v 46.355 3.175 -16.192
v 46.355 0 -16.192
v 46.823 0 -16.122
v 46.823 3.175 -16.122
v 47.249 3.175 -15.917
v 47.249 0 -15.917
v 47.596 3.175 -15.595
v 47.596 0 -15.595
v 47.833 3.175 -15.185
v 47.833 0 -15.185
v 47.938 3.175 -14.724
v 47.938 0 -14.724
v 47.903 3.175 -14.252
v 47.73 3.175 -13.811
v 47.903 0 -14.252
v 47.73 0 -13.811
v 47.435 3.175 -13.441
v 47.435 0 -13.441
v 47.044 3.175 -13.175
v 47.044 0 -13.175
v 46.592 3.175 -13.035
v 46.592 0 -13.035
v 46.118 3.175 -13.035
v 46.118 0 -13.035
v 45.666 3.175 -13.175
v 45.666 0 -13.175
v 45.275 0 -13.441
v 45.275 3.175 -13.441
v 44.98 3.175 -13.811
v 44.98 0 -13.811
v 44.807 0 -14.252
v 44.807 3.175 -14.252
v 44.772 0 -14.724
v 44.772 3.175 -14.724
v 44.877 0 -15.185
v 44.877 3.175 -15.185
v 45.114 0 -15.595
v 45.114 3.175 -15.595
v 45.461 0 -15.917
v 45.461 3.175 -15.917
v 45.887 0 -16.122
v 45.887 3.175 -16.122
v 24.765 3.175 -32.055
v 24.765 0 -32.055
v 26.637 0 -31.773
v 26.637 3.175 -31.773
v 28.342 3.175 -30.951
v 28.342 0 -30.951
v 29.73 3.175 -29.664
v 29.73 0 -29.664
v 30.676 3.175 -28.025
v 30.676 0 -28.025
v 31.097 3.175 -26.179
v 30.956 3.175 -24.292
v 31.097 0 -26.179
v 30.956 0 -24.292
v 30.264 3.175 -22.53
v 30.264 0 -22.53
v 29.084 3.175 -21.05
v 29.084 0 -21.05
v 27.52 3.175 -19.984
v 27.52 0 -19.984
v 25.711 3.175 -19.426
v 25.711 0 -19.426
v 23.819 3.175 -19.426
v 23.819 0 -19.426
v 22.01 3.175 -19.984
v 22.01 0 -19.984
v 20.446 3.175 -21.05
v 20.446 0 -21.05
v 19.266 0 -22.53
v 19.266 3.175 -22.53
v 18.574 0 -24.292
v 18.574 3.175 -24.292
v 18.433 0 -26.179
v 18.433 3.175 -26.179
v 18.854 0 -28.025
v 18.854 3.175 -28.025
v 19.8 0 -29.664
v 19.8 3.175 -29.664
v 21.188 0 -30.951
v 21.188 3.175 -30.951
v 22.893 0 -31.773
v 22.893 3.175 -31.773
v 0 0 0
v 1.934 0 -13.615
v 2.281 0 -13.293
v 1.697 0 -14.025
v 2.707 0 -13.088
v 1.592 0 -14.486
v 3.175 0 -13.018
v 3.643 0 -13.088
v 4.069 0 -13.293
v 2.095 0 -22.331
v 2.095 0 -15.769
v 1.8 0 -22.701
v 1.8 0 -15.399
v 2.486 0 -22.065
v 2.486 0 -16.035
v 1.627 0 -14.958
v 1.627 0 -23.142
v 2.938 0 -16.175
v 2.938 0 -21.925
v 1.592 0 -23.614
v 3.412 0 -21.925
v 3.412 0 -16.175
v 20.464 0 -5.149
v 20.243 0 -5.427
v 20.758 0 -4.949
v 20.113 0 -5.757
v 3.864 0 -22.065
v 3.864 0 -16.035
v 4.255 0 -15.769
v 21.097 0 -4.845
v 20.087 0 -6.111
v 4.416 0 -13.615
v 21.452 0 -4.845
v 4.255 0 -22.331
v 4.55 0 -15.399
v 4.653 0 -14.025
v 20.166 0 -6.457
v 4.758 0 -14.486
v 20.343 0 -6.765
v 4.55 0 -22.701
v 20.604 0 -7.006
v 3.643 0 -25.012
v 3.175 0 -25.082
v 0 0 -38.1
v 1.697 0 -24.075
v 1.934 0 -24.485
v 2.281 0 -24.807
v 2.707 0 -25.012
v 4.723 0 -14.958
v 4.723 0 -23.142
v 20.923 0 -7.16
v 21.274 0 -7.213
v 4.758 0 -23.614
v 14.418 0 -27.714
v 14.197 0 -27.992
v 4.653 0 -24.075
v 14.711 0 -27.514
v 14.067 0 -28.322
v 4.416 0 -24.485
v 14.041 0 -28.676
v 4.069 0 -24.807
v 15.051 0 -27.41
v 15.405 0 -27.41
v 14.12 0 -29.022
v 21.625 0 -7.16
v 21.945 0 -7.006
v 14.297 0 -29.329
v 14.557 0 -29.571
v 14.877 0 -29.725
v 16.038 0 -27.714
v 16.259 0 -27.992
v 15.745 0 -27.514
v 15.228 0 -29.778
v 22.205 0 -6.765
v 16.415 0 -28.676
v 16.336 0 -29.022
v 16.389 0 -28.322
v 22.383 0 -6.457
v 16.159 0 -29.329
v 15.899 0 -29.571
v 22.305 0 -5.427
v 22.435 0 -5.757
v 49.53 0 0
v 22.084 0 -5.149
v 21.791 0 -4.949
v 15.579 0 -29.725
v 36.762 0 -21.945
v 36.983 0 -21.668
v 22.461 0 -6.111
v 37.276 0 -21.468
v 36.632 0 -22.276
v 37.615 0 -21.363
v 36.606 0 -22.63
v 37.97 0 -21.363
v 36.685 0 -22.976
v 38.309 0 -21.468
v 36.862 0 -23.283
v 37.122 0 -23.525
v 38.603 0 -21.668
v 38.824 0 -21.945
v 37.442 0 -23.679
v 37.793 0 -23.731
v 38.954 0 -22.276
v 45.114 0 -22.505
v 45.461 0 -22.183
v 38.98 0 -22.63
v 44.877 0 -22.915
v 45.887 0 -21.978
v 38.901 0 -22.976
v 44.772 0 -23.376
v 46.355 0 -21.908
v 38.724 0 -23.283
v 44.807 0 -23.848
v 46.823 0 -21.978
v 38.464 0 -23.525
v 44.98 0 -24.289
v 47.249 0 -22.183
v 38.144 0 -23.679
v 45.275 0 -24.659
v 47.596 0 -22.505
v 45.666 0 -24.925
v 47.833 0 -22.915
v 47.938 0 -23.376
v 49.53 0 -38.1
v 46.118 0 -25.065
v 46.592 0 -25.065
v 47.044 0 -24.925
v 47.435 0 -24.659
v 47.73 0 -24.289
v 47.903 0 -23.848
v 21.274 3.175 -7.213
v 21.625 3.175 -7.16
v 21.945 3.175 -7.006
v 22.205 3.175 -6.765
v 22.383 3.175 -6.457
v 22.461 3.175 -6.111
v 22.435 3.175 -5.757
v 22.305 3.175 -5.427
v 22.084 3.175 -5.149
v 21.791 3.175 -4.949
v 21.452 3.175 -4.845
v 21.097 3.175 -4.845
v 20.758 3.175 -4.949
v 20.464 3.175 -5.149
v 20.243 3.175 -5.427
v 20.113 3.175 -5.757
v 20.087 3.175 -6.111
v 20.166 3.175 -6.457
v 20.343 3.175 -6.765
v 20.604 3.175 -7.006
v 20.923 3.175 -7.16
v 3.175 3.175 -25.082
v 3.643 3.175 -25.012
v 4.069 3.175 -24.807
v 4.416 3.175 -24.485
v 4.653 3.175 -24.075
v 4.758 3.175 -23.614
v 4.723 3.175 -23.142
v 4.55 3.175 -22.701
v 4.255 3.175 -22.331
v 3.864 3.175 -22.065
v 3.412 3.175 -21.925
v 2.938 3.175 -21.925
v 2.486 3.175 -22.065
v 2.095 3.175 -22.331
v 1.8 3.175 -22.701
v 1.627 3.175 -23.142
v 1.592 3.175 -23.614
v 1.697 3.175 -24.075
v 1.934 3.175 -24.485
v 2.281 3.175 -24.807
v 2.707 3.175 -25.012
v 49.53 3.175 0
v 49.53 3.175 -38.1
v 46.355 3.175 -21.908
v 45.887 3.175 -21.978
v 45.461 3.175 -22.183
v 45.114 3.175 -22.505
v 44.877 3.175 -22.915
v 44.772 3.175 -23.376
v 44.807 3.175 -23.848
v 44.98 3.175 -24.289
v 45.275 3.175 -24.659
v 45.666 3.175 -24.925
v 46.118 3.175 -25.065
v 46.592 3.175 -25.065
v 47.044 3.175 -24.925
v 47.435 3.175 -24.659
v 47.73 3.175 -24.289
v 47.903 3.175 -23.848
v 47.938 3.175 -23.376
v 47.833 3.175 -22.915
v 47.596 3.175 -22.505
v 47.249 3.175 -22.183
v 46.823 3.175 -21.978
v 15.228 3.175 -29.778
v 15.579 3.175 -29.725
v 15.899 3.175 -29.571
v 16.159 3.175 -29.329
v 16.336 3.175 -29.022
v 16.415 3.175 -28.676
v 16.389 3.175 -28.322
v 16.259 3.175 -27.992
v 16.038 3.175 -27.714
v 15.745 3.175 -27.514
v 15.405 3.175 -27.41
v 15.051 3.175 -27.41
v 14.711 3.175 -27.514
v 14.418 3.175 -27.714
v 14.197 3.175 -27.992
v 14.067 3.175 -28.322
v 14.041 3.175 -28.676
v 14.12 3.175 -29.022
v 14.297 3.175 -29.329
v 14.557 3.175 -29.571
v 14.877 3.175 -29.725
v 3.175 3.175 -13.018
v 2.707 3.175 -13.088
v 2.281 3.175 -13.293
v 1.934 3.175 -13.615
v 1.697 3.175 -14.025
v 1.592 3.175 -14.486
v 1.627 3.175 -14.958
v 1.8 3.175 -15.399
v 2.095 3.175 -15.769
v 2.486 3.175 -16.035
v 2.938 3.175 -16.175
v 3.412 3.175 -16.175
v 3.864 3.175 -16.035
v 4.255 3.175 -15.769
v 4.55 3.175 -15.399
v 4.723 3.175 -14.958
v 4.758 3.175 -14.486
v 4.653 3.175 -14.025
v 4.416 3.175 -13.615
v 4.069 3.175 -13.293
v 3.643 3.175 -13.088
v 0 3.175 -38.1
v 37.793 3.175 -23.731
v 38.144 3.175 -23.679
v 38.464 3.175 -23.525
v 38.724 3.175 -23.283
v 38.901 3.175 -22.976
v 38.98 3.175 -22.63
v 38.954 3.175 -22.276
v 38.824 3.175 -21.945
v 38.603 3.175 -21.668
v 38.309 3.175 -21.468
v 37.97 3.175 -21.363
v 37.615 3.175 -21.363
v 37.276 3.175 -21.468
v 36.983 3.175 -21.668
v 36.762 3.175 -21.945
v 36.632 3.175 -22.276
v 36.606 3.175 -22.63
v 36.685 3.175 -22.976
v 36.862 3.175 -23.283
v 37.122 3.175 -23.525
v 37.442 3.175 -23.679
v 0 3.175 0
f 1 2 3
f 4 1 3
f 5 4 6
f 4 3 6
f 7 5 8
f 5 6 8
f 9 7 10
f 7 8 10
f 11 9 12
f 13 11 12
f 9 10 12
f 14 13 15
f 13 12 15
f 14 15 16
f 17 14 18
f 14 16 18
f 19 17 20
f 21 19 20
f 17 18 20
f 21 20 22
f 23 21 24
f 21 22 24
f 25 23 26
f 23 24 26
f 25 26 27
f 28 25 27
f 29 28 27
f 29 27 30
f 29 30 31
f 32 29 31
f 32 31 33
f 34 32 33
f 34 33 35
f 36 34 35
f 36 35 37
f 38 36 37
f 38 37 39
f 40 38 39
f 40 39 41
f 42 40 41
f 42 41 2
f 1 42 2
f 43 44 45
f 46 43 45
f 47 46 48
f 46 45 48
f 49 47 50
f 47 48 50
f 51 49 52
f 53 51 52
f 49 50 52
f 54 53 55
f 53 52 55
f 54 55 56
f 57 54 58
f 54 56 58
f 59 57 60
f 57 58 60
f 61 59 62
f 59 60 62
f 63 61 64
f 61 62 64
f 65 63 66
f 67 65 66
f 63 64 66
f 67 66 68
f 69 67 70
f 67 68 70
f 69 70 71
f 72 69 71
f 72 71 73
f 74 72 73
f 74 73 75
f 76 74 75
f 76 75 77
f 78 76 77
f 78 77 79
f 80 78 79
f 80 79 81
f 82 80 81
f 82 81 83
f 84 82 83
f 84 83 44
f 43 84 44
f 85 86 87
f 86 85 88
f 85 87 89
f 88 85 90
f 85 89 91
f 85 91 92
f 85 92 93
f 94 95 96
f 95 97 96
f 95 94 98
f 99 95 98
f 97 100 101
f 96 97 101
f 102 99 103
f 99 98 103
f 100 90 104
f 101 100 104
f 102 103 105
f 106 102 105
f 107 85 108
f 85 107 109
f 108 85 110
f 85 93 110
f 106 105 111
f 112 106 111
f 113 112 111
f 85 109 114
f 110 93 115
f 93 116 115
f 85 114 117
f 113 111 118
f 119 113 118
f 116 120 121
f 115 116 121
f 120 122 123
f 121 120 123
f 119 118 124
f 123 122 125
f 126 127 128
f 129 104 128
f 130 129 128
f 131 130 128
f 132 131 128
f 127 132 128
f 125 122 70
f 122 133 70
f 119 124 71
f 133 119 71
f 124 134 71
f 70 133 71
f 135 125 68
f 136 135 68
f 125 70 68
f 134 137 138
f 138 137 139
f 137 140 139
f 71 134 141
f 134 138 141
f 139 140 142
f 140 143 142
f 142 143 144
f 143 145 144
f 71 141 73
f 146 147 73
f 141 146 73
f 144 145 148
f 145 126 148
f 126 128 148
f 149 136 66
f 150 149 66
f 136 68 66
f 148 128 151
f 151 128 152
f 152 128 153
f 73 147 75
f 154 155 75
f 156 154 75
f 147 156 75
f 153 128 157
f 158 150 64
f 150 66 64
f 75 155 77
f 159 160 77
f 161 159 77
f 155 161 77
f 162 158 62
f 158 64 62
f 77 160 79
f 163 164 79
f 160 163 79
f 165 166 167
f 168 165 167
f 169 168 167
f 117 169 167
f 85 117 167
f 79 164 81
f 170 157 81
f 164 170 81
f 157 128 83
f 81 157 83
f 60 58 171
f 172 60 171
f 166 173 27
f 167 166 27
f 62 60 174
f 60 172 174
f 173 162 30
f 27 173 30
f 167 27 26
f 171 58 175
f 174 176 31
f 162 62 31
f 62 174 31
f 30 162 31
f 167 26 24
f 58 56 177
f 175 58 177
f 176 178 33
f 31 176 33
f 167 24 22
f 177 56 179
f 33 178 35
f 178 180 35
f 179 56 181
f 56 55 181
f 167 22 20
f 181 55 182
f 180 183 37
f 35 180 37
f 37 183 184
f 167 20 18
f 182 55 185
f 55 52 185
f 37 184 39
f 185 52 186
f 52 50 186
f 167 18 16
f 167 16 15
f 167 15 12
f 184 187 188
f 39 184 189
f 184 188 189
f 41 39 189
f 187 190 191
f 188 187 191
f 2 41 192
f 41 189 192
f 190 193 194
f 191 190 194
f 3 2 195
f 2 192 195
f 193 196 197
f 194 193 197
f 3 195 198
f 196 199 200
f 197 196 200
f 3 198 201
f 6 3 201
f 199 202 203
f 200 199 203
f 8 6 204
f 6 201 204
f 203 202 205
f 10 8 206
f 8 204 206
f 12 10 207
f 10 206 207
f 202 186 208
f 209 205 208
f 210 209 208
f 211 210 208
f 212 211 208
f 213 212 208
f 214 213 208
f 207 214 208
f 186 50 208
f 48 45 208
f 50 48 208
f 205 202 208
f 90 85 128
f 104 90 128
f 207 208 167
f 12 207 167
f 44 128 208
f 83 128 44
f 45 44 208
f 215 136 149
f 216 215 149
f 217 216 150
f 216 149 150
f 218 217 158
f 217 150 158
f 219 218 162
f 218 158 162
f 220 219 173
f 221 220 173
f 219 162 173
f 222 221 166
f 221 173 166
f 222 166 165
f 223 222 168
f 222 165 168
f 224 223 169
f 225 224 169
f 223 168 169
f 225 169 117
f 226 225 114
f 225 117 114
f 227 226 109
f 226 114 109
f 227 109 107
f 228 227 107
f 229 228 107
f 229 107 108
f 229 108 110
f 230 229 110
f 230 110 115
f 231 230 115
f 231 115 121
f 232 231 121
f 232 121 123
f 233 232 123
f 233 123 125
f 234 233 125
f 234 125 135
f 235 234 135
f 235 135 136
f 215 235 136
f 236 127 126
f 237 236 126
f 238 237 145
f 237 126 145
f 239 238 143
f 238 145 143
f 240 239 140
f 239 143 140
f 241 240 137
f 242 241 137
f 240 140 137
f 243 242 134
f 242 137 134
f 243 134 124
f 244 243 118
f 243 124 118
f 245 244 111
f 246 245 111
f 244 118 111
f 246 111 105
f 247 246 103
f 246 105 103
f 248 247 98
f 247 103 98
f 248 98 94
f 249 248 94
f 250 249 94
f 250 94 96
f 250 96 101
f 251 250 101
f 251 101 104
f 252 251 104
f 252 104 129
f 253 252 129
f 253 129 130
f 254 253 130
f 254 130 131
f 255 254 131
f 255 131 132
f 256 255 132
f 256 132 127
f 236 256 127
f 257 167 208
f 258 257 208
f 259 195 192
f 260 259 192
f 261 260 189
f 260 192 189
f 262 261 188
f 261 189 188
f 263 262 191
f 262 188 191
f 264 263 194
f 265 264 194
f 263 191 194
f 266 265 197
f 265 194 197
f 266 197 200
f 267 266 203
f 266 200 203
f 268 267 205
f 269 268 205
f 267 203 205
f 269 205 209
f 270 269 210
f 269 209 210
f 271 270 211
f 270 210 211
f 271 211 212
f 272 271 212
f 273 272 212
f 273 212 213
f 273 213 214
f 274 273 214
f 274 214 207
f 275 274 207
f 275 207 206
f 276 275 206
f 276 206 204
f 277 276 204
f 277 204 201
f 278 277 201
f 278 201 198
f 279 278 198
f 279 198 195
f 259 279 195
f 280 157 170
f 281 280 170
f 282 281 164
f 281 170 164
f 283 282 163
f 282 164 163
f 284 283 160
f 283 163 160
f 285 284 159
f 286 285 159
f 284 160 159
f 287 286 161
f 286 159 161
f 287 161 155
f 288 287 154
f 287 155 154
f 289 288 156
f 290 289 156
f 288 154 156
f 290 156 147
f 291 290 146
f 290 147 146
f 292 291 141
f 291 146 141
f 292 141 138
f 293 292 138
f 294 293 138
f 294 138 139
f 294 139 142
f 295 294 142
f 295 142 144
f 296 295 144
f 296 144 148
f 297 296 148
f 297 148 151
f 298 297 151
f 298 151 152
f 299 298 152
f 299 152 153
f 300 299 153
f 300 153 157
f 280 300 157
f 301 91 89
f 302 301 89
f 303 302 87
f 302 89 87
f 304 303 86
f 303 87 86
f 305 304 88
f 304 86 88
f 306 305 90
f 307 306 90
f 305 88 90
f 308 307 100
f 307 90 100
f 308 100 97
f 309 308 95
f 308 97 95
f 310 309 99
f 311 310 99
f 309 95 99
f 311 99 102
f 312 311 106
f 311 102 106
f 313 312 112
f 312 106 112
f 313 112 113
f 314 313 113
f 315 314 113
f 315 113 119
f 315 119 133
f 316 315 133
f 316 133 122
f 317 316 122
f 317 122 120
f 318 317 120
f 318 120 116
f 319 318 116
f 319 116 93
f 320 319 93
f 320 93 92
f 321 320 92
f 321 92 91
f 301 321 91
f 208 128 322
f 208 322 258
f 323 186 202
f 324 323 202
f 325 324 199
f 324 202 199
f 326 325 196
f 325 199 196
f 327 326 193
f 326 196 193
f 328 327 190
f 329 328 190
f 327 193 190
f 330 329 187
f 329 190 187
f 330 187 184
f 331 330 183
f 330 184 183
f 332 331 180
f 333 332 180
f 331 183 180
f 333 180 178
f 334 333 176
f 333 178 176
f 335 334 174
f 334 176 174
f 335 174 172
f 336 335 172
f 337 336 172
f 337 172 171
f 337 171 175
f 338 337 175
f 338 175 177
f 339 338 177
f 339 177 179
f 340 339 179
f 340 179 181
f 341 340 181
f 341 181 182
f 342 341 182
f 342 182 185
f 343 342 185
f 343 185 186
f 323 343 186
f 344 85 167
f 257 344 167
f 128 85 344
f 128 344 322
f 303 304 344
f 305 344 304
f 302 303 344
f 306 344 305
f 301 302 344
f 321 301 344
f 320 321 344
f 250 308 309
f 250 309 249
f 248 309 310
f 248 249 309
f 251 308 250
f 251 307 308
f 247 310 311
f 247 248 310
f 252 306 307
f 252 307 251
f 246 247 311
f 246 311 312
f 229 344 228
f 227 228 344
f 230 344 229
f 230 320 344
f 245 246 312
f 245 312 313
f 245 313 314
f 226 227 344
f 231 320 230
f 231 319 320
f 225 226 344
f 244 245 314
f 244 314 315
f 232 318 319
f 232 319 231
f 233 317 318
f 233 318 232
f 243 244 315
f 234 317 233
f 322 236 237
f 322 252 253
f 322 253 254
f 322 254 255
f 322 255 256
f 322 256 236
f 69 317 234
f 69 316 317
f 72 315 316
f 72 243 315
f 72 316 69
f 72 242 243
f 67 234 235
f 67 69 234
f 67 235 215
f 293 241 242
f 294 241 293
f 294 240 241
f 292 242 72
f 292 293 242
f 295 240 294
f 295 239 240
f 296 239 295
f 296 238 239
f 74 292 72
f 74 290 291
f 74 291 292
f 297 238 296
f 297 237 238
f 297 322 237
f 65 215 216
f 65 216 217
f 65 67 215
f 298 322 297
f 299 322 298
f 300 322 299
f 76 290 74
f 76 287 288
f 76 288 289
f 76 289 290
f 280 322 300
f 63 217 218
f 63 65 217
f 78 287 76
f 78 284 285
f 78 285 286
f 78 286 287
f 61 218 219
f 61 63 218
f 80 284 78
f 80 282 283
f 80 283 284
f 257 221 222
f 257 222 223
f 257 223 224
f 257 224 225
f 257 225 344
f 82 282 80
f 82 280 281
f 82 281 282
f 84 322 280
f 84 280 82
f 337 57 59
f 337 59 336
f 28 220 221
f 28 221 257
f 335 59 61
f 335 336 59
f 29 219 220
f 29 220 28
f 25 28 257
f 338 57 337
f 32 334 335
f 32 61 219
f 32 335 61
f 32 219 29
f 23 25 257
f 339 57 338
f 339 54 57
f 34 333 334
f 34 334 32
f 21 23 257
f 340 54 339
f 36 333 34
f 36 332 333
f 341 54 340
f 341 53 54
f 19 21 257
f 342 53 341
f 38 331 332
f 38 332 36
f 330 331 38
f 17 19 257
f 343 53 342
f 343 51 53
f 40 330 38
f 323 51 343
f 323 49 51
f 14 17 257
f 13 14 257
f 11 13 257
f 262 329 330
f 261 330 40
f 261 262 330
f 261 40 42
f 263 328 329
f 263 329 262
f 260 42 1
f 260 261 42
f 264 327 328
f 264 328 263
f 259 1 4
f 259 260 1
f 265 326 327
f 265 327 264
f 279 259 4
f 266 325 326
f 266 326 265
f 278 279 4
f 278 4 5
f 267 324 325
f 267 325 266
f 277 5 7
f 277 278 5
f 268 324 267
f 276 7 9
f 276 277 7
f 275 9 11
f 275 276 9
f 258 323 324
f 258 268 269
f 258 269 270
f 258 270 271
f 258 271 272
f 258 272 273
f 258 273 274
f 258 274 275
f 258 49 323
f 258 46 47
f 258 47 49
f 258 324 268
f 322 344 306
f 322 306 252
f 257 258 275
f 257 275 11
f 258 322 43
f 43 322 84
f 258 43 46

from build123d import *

# Parameters (mm, degrees)
SKETCH1_W           = 49.53
SKETCH1_H           = 38.1
BOSS_EXTRUDE1_DEPTH = 3.175
SKETCH4_R           = 1.190625
SKETCH4_R_2         = 6.35
SKETCH4_R_3         = 1.5875
CUT_EXTRUDE2_DEPTH  = 63.569253831


with BuildPart() as part:
    # Sketch1 → Boss-Extrude1 (new body)
    with BuildSketch(Plane(origin=(0, 0, 0), x_dir=(1, 0, 0), z_dir=(0, 1, 0))):
        with Locations((24.765, 19.05)):
            Rectangle(SKETCH1_W, SKETCH1_H)
    extrude(amount=BOSS_EXTRUDE1_DEPTH)

    # Sketch4 → Cut-Extrude2 (cut, through all)
    with BuildSketch(Plane.XZ):
        with Locations(Location((21.274204011, -6.022172011, 0), (0, 0, 270))):
            Circle(SKETCH4_R)
        with Locations(Location((37.792827989, -22.540795989, 0), (0, 0, 270))):
            Circle(SKETCH4_R)
        with Locations(Location((15.227967999, -28.587032001, 0), (0, 0, 270))):
            Circle(SKETCH4_R)
        with Locations(Location((24.765, -25.7048, 0), (0, 0, 270))):
            Circle(SKETCH4_R_2)
        with Locations(Location((3.175, -23.495, 0), (0, 0, 270))):
            Circle(SKETCH4_R_3)
        with Locations(Location((3.175, -14.605, 0), (0, 0, 90))):
            Circle(SKETCH4_R_3)
        with Locations(Location((46.355, -14.605, 0), (0, 0, 270))):
            Circle(SKETCH4_R_3)
        with Locations(Location((46.355, -23.495, 0), (0, 0, 90))):
            Circle(SKETCH4_R_3)
    extrude(amount=-CUT_EXTRUDE2_DEPTH, mode=Mode.SUBTRACT)


solid = part.part
